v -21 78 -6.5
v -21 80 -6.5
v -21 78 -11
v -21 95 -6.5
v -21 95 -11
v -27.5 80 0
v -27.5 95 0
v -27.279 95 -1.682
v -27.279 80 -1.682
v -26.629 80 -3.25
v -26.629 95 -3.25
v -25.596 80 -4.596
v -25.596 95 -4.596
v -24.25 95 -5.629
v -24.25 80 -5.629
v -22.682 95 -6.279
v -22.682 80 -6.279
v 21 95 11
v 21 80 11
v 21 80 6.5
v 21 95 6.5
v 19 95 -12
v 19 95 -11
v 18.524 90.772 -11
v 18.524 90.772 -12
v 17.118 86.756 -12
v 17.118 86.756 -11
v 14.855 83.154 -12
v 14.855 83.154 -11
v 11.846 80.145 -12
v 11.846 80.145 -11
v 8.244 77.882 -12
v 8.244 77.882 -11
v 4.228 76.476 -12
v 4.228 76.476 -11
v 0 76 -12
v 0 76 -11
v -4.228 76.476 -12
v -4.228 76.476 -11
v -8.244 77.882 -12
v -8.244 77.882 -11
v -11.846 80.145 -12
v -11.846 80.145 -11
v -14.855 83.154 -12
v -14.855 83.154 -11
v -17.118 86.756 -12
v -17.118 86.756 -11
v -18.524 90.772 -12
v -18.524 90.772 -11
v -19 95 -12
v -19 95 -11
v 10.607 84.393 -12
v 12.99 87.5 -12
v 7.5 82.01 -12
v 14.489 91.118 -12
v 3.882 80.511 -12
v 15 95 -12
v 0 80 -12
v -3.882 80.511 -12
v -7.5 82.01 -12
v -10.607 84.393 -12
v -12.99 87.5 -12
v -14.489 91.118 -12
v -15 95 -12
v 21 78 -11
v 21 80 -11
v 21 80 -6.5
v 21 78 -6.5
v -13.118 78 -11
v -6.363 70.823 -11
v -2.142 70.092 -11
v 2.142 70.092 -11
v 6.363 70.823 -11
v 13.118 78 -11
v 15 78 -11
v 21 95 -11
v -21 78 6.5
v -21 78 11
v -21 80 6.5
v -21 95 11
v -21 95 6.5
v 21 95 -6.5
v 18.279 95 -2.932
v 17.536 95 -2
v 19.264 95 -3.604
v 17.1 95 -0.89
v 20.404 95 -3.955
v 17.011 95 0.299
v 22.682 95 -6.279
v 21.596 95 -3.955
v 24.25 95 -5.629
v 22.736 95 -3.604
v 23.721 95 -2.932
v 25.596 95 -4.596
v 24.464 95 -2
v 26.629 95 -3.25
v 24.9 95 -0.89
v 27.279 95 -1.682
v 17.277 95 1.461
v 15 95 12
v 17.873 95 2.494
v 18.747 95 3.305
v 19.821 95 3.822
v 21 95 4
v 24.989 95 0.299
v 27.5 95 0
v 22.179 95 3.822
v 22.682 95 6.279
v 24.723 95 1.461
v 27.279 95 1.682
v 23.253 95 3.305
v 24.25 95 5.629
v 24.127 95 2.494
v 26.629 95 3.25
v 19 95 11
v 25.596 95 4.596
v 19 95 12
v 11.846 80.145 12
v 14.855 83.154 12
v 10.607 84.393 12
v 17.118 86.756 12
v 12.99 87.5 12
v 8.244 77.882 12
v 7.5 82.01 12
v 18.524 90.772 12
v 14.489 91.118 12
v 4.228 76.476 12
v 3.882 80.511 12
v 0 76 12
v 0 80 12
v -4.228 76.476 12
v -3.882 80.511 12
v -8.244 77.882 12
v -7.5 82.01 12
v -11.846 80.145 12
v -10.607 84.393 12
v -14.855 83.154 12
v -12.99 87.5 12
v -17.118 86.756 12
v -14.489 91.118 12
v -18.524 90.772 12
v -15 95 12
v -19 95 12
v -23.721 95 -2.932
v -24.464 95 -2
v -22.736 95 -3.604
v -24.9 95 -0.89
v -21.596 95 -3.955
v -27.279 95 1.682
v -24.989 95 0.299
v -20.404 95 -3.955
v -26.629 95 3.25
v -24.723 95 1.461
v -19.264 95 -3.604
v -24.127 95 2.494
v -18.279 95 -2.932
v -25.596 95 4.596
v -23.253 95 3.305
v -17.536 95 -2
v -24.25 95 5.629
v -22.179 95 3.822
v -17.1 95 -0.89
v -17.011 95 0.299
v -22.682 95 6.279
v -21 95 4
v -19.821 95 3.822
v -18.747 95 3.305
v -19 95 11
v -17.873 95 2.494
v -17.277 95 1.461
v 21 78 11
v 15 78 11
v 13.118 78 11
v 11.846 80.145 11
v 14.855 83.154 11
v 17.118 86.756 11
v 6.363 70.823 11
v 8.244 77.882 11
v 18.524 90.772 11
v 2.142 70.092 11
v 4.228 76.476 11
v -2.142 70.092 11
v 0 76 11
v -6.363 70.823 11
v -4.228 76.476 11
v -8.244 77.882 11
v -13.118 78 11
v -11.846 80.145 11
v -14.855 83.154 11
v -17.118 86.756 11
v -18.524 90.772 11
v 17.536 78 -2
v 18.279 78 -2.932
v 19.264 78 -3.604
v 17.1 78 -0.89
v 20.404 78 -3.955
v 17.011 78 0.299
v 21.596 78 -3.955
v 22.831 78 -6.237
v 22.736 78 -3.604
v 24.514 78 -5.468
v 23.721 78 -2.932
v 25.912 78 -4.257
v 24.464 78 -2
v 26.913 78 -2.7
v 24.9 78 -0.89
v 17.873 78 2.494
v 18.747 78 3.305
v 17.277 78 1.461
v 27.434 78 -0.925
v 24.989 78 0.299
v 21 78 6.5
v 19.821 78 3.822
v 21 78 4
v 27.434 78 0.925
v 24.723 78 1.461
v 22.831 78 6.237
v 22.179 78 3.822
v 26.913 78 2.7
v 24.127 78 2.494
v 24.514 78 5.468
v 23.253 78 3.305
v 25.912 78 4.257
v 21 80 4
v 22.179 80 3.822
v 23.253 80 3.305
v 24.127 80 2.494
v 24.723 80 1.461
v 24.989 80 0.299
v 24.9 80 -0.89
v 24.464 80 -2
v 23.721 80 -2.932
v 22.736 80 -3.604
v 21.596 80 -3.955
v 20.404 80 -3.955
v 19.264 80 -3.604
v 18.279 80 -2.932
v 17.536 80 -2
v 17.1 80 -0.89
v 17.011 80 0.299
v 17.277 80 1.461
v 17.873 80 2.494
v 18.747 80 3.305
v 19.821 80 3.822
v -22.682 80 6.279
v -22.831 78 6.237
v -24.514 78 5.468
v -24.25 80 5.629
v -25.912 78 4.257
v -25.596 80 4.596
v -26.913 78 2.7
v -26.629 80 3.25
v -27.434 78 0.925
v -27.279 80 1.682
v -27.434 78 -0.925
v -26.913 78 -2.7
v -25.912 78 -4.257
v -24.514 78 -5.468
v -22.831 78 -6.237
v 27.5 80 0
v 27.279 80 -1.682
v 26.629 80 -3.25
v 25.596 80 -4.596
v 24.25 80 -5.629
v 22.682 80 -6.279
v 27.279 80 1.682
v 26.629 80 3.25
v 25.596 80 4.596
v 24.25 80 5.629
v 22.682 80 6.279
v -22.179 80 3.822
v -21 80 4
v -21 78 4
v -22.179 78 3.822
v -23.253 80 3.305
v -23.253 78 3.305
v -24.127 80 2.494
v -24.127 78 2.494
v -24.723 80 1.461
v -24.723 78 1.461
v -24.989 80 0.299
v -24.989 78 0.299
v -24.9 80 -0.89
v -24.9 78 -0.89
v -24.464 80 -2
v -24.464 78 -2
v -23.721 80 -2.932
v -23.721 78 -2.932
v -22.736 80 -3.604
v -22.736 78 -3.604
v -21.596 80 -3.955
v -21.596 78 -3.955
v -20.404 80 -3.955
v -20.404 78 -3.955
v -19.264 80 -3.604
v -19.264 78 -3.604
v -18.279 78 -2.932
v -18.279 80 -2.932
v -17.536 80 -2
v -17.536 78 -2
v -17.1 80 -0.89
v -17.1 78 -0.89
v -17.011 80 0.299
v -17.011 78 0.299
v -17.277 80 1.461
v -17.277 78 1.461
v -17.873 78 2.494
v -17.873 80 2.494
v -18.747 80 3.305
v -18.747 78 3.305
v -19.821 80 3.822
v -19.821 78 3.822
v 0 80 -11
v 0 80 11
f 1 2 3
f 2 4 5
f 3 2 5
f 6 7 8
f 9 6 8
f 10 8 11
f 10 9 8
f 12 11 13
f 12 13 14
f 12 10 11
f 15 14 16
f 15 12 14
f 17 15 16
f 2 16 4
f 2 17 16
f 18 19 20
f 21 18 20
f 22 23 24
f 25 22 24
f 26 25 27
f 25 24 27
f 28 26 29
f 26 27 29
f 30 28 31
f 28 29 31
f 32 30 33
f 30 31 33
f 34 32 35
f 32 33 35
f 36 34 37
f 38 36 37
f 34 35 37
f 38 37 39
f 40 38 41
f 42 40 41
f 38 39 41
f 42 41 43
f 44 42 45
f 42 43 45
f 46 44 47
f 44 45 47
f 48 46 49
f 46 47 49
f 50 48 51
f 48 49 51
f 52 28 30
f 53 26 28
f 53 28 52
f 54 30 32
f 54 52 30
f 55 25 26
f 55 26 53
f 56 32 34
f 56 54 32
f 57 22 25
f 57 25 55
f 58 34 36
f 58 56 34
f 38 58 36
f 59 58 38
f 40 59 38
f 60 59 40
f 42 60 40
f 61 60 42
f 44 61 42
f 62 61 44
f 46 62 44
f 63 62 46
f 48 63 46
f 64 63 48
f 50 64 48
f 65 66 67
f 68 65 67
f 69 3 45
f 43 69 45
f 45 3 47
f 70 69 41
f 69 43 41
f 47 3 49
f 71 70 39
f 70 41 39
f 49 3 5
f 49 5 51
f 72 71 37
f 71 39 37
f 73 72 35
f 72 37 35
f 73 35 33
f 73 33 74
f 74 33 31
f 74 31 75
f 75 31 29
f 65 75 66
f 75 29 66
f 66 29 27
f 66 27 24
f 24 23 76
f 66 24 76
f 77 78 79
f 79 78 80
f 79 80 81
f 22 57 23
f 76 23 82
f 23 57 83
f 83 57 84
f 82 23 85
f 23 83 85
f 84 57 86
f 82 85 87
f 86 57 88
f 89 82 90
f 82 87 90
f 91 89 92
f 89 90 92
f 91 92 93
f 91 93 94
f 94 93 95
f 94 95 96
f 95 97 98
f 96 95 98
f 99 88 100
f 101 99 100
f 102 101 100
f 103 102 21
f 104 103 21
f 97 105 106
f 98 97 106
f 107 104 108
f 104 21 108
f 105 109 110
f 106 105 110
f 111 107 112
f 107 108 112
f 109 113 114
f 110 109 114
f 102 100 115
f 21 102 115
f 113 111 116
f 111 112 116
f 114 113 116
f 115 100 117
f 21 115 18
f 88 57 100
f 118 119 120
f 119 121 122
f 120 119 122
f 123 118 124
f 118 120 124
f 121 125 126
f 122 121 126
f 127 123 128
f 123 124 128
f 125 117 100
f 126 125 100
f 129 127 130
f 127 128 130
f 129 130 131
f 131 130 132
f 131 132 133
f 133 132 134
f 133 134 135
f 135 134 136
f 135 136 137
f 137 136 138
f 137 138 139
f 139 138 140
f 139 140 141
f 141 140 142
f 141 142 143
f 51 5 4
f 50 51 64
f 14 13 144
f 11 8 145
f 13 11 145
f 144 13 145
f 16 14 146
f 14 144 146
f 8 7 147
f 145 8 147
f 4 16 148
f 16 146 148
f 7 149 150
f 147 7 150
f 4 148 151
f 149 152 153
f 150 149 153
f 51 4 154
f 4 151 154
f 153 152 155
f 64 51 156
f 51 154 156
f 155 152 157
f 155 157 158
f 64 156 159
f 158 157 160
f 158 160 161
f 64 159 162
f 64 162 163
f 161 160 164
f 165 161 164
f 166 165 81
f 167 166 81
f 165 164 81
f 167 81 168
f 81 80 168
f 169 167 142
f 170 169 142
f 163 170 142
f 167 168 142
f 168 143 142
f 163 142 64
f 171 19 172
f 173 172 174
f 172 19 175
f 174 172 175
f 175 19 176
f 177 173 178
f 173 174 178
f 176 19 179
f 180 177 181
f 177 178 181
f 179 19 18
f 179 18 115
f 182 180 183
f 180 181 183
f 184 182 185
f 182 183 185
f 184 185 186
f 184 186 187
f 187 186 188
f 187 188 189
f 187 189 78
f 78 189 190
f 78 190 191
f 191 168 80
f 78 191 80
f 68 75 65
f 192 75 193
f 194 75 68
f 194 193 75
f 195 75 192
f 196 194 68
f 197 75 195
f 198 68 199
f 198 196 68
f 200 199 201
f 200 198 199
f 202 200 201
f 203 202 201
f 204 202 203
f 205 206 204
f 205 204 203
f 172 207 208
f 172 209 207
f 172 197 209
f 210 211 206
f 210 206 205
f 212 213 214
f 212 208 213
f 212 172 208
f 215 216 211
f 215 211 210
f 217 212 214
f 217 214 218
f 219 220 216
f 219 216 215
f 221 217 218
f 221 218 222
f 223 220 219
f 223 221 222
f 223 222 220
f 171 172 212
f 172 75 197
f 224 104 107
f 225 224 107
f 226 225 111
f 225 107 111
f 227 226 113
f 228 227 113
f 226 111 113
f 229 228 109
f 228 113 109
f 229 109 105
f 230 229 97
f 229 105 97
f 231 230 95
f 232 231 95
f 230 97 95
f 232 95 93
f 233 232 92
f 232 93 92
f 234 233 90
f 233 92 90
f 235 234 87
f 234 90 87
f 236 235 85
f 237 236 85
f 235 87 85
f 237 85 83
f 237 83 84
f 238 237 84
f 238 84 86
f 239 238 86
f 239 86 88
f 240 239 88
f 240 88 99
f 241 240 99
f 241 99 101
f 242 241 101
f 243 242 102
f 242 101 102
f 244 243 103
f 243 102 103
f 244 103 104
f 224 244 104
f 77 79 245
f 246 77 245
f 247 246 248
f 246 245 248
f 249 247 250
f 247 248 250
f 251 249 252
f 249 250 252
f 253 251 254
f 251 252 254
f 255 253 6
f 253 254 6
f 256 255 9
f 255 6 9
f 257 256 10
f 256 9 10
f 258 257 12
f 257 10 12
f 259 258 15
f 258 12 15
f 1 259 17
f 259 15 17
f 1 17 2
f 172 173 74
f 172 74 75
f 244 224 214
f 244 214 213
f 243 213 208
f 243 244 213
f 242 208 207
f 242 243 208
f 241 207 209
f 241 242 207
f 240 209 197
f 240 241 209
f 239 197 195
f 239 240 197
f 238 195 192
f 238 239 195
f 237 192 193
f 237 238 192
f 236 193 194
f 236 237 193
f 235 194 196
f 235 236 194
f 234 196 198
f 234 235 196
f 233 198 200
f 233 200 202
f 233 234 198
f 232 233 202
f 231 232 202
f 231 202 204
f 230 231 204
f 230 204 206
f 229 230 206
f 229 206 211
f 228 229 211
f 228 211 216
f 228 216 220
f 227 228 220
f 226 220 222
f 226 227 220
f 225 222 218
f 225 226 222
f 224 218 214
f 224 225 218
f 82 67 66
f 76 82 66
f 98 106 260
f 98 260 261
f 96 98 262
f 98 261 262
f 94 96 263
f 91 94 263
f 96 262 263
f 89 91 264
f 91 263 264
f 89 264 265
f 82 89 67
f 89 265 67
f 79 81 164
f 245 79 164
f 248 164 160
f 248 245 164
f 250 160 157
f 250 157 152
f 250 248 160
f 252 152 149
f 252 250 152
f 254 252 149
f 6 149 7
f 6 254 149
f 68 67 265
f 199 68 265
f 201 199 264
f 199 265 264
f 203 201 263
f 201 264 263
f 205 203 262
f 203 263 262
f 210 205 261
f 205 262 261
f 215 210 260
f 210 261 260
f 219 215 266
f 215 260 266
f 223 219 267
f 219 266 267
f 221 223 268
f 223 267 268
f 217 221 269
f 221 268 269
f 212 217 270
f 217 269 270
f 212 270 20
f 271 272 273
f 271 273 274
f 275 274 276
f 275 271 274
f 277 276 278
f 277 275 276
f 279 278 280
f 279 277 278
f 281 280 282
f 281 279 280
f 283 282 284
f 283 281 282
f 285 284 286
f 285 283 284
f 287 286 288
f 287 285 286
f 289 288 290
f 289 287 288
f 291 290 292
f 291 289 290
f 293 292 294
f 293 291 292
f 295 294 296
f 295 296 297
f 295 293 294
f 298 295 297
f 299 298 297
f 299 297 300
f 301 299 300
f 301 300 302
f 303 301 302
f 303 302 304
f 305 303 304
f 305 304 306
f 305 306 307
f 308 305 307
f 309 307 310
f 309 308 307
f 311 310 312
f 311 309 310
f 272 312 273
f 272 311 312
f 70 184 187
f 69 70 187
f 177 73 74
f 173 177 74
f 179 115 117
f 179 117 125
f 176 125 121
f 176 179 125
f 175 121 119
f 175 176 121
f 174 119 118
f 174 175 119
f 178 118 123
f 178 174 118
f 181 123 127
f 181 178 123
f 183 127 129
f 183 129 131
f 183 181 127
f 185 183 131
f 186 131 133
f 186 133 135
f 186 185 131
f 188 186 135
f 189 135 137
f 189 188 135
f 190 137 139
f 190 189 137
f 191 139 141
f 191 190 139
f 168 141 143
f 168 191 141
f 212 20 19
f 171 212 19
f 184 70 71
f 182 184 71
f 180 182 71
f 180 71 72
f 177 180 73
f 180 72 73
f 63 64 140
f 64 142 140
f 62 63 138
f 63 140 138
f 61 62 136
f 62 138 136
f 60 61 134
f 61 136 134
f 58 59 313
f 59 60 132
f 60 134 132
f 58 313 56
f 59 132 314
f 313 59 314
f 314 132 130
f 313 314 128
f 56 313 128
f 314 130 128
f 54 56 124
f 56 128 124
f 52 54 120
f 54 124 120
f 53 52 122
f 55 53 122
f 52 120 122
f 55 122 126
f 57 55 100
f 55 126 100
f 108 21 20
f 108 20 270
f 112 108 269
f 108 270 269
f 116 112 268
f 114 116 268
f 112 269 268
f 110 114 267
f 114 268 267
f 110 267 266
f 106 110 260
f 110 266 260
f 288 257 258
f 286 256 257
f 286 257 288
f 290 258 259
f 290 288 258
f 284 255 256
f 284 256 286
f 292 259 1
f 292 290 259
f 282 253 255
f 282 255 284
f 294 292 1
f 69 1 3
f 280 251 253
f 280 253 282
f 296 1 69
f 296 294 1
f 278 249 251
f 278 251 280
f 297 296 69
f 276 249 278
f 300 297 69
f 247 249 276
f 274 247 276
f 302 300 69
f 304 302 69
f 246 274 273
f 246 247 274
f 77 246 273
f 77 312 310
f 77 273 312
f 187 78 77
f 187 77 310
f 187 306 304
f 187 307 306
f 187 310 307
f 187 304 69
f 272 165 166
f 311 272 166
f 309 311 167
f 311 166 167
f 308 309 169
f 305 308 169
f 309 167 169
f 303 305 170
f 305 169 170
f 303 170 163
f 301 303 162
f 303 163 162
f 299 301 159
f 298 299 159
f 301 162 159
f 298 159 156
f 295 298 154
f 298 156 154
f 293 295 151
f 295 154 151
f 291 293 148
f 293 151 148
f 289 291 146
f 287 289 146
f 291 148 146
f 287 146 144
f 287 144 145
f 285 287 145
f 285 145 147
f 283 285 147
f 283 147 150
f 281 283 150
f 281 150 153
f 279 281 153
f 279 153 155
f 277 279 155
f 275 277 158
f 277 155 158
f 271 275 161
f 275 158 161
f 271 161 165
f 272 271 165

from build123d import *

# Parameters (mm, degrees)
EXTRUDE_2_DEPTH      = 11
EXTRUDE_2_DEPTH_BACK = 11
EXTRUDE_3_DEPTH      = 1
SKETCH_9_R           = 4
CUT_EXTRUDE_5_DEPTH  = 15
CUT_EXTRUDE_6_DEPTH  = 15
CHAMFER_1_SIZE       = 5
CHAMFER_2_SIZE       = 5
SKETCH_11_R          = 4
SKETCH_11_W          = 30
SKETCH_11_H          = 22
EXTRUDE_5_DEPTH      = 2


with BuildPart() as part:
    # Эскиз3 → Бобышка-Вытянуть2 (new, two sides: drawn at the far end of the back side and taken through both)
    with BuildSketch(Plane.XY.offset(-EXTRUDE_2_DEPTH_BACK)):
        with BuildLine():
            ThreePointArc((15, 95), (0, 80), (-15, 95))
            Line((-15, 95), (-27.5, 95))
            Line((-27.5, 95), (-27.5, 80))
            Line((-27.5, 80), (-15, 80))
            Line((-15, 80), (-15, 75))
            ThreePointArc((-15, 75), (0, 70), (15, 75))
            Line((15, 75), (15, 80))
            Line((15, 80), (27.5, 80))
            Line((27.5, 80), (27.5, 95))
            Line((27.5, 95), (15, 95))
        make_face()
    extrude(amount=EXTRUDE_2_DEPTH + EXTRUDE_2_DEPTH_BACK)

    # Эскиз5 → Бобышка-Вытянуть3 (add)
    with BuildSketch(Plane.XY.offset(11)):
        with BuildLine():
            Line((-19, 95), (-15, 95))
            ThreePointArc((-15, 95), (0, 80), (15, 95))
            Line((15, 95), (19, 95))
            ThreePointArc((19, 95), (0, 76), (-19, 95))
        make_face()
    extrude_3 = extrude(amount=EXTRUDE_3_DEPTH)

    # Зеркальное отражение1: Бобышка-Вытянуть3 across plane
    add(extrude_3.mirror(Plane.XY))

    # Эскиз9 → Вырез-Вытянуть5 (cut)
    with BuildSketch(Plane(origin=(0, 95, 0), x_dir=(1, 0, 0), z_dir=(0, 1, 0))):
        with Locations(Location((21, 0, 0), (0, 0, 270))):
            Circle(SKETCH_9_R)
        with Locations(Location((-21, 0, 0), (0, 0, 270))):
            Circle(SKETCH_9_R)
    extrude(amount=-CUT_EXTRUDE_5_DEPTH, mode=Mode.SUBTRACT)

    # Эскиз10 → Вырез-Вытянуть6 (cut)
    with BuildSketch(Plane.XZ.offset(-80)):
        with BuildLine():
            Line((27.5, -11), (27.5, 0))
            ThreePointArc((27.5, 0), (25.596194078, -4.596194078), (21, -6.5))
            Line((21, -6.5), (21, -11))
            Line((21, -11), (27.5, -11))
        make_face()
        with BuildLine():
            Line((21, 11), (21, 6.5))
            ThreePointArc((21, 6.5), (25.596194078, 4.596194078), (27.5, 0))
            Line((27.5, 0), (27.5, 11))
            Line((27.5, 11), (21, 11))
        make_face()
    cut_extrude_6 = extrude(amount=-CUT_EXTRUDE_6_DEPTH, mode=Mode.SUBTRACT)

    # Зеркальное отражение2: Вырез-Вытянуть6 across plane
    add(cut_extrude_6.mirror(Plane(origin=(0, 0, 0), x_dir=(0, 0, 1), z_dir=(1, 0, 0))), mode=Mode.SUBTRACT)

    # Фаска1
    # the kernel refuses this chamfer: 20, 5 mm, written as the material it takes off along each edge
    with BuildSketch(Plane(origin=(-15, 75, -36.862227042), x_dir=(0.9002602258420863, -0.4353521858986766, 0), z_dir=(0, 0, 1))) as chamfer_1_piece_1_section:
        with BuildLine():
            Line((9.593719339, 0), (-CHAMFER_1_SIZE * 0.435352185899, CHAMFER_1_SIZE * 0.900260225842))
            Line((-CHAMFER_1_SIZE * 0.435352185899, CHAMFER_1_SIZE * 0.900260225842), (0, 0))
            ThreePointArc((0, 0), (5.175297631, -0.461648225), (9.593719339, 0))
        make_face()
    chamfer_1_piece_1 = extrude(amount=73.724454084, mode=Mode.PRIVATE)
    chamfer_1_piece_1 = split(chamfer_1_piece_1, bisect_by=Plane(origin=(-15, 80, -36.862227042), z_dir=(0, -1, 0)), keep=Keep.TOP, mode=Mode.PRIVATE)
    add(chamfer_1_piece_1, mode=Mode.SUBTRACT)

    # Фаска2
    # the kernel refuses this chamfer: 20, 5 mm, written as the material it takes off along each edge
    with BuildSketch(Plane(origin=(15, 75, -36.862227042), x_dir=(-0.9002602258420859, -0.43535218589867725, 0), z_dir=(0, 0, 1))) as chamfer_2_piece_1:
        with BuildLine():
            Line((9.593719339, 0), (-CHAMFER_2_SIZE * 0.435352185899, -CHAMFER_2_SIZE * 0.900260225842))
            Line((-CHAMFER_2_SIZE * 0.435352185899, -CHAMFER_2_SIZE * 0.900260225842), (0, 0))
            ThreePointArc((0, 0), (5.175297631, 0.461648225), (9.593719339, 0))
        make_face()
    extrude(amount=73.724454084, mode=Mode.SUBTRACT)

    # Эскиз11 → Бобышка-Вытянуть5 (add)
    # profile 1 of 3: a face of its own
    with BuildSketch(Plane.XZ.offset(-80)):
        with BuildLine():
            Line((-15, 11), (-21, 11))
            Line((-21, 11), (-21, 6.5))
            ThreePointArc((-21, 6.5), (-27.5, 0), (-21, -6.5))
            Line((-21, -6.5), (-21, -11))
            Line((-21, -11), (-15, -11))
            Line((-15, -11), (-15, 11))
        make_face()
        with Locations(Location((-21, 0, 0), (0, 0, 90))):
            Circle(SKETCH_11_R, mode=Mode.SUBTRACT)
    # profile 2 of 3: a face of its own
    with BuildSketch(Plane.XZ.offset(-80)):
        with BuildLine():
            Line((21, -11), (21, -6.5))
            ThreePointArc((21, -6.5), (27.5, 0), (21, 6.5))
            Line((21, 6.5), (21, 11))
            Line((21, 11), (15, 11))
            Line((15, 11), (15, -11))
            Line((15, -11), (21, -11))
        make_face()
        with Locations(Location((21, 0, 0), (0, 0, 90))):
            Circle(SKETCH_11_R, mode=Mode.SUBTRACT)
    # profile 3 of 3: a face of its own
    with BuildSketch(Plane.XZ.offset(-80)):
        Rectangle(SKETCH_11_W, SKETCH_11_H)
    extrude(amount=EXTRUDE_5_DEPTH)


solid = part.part
